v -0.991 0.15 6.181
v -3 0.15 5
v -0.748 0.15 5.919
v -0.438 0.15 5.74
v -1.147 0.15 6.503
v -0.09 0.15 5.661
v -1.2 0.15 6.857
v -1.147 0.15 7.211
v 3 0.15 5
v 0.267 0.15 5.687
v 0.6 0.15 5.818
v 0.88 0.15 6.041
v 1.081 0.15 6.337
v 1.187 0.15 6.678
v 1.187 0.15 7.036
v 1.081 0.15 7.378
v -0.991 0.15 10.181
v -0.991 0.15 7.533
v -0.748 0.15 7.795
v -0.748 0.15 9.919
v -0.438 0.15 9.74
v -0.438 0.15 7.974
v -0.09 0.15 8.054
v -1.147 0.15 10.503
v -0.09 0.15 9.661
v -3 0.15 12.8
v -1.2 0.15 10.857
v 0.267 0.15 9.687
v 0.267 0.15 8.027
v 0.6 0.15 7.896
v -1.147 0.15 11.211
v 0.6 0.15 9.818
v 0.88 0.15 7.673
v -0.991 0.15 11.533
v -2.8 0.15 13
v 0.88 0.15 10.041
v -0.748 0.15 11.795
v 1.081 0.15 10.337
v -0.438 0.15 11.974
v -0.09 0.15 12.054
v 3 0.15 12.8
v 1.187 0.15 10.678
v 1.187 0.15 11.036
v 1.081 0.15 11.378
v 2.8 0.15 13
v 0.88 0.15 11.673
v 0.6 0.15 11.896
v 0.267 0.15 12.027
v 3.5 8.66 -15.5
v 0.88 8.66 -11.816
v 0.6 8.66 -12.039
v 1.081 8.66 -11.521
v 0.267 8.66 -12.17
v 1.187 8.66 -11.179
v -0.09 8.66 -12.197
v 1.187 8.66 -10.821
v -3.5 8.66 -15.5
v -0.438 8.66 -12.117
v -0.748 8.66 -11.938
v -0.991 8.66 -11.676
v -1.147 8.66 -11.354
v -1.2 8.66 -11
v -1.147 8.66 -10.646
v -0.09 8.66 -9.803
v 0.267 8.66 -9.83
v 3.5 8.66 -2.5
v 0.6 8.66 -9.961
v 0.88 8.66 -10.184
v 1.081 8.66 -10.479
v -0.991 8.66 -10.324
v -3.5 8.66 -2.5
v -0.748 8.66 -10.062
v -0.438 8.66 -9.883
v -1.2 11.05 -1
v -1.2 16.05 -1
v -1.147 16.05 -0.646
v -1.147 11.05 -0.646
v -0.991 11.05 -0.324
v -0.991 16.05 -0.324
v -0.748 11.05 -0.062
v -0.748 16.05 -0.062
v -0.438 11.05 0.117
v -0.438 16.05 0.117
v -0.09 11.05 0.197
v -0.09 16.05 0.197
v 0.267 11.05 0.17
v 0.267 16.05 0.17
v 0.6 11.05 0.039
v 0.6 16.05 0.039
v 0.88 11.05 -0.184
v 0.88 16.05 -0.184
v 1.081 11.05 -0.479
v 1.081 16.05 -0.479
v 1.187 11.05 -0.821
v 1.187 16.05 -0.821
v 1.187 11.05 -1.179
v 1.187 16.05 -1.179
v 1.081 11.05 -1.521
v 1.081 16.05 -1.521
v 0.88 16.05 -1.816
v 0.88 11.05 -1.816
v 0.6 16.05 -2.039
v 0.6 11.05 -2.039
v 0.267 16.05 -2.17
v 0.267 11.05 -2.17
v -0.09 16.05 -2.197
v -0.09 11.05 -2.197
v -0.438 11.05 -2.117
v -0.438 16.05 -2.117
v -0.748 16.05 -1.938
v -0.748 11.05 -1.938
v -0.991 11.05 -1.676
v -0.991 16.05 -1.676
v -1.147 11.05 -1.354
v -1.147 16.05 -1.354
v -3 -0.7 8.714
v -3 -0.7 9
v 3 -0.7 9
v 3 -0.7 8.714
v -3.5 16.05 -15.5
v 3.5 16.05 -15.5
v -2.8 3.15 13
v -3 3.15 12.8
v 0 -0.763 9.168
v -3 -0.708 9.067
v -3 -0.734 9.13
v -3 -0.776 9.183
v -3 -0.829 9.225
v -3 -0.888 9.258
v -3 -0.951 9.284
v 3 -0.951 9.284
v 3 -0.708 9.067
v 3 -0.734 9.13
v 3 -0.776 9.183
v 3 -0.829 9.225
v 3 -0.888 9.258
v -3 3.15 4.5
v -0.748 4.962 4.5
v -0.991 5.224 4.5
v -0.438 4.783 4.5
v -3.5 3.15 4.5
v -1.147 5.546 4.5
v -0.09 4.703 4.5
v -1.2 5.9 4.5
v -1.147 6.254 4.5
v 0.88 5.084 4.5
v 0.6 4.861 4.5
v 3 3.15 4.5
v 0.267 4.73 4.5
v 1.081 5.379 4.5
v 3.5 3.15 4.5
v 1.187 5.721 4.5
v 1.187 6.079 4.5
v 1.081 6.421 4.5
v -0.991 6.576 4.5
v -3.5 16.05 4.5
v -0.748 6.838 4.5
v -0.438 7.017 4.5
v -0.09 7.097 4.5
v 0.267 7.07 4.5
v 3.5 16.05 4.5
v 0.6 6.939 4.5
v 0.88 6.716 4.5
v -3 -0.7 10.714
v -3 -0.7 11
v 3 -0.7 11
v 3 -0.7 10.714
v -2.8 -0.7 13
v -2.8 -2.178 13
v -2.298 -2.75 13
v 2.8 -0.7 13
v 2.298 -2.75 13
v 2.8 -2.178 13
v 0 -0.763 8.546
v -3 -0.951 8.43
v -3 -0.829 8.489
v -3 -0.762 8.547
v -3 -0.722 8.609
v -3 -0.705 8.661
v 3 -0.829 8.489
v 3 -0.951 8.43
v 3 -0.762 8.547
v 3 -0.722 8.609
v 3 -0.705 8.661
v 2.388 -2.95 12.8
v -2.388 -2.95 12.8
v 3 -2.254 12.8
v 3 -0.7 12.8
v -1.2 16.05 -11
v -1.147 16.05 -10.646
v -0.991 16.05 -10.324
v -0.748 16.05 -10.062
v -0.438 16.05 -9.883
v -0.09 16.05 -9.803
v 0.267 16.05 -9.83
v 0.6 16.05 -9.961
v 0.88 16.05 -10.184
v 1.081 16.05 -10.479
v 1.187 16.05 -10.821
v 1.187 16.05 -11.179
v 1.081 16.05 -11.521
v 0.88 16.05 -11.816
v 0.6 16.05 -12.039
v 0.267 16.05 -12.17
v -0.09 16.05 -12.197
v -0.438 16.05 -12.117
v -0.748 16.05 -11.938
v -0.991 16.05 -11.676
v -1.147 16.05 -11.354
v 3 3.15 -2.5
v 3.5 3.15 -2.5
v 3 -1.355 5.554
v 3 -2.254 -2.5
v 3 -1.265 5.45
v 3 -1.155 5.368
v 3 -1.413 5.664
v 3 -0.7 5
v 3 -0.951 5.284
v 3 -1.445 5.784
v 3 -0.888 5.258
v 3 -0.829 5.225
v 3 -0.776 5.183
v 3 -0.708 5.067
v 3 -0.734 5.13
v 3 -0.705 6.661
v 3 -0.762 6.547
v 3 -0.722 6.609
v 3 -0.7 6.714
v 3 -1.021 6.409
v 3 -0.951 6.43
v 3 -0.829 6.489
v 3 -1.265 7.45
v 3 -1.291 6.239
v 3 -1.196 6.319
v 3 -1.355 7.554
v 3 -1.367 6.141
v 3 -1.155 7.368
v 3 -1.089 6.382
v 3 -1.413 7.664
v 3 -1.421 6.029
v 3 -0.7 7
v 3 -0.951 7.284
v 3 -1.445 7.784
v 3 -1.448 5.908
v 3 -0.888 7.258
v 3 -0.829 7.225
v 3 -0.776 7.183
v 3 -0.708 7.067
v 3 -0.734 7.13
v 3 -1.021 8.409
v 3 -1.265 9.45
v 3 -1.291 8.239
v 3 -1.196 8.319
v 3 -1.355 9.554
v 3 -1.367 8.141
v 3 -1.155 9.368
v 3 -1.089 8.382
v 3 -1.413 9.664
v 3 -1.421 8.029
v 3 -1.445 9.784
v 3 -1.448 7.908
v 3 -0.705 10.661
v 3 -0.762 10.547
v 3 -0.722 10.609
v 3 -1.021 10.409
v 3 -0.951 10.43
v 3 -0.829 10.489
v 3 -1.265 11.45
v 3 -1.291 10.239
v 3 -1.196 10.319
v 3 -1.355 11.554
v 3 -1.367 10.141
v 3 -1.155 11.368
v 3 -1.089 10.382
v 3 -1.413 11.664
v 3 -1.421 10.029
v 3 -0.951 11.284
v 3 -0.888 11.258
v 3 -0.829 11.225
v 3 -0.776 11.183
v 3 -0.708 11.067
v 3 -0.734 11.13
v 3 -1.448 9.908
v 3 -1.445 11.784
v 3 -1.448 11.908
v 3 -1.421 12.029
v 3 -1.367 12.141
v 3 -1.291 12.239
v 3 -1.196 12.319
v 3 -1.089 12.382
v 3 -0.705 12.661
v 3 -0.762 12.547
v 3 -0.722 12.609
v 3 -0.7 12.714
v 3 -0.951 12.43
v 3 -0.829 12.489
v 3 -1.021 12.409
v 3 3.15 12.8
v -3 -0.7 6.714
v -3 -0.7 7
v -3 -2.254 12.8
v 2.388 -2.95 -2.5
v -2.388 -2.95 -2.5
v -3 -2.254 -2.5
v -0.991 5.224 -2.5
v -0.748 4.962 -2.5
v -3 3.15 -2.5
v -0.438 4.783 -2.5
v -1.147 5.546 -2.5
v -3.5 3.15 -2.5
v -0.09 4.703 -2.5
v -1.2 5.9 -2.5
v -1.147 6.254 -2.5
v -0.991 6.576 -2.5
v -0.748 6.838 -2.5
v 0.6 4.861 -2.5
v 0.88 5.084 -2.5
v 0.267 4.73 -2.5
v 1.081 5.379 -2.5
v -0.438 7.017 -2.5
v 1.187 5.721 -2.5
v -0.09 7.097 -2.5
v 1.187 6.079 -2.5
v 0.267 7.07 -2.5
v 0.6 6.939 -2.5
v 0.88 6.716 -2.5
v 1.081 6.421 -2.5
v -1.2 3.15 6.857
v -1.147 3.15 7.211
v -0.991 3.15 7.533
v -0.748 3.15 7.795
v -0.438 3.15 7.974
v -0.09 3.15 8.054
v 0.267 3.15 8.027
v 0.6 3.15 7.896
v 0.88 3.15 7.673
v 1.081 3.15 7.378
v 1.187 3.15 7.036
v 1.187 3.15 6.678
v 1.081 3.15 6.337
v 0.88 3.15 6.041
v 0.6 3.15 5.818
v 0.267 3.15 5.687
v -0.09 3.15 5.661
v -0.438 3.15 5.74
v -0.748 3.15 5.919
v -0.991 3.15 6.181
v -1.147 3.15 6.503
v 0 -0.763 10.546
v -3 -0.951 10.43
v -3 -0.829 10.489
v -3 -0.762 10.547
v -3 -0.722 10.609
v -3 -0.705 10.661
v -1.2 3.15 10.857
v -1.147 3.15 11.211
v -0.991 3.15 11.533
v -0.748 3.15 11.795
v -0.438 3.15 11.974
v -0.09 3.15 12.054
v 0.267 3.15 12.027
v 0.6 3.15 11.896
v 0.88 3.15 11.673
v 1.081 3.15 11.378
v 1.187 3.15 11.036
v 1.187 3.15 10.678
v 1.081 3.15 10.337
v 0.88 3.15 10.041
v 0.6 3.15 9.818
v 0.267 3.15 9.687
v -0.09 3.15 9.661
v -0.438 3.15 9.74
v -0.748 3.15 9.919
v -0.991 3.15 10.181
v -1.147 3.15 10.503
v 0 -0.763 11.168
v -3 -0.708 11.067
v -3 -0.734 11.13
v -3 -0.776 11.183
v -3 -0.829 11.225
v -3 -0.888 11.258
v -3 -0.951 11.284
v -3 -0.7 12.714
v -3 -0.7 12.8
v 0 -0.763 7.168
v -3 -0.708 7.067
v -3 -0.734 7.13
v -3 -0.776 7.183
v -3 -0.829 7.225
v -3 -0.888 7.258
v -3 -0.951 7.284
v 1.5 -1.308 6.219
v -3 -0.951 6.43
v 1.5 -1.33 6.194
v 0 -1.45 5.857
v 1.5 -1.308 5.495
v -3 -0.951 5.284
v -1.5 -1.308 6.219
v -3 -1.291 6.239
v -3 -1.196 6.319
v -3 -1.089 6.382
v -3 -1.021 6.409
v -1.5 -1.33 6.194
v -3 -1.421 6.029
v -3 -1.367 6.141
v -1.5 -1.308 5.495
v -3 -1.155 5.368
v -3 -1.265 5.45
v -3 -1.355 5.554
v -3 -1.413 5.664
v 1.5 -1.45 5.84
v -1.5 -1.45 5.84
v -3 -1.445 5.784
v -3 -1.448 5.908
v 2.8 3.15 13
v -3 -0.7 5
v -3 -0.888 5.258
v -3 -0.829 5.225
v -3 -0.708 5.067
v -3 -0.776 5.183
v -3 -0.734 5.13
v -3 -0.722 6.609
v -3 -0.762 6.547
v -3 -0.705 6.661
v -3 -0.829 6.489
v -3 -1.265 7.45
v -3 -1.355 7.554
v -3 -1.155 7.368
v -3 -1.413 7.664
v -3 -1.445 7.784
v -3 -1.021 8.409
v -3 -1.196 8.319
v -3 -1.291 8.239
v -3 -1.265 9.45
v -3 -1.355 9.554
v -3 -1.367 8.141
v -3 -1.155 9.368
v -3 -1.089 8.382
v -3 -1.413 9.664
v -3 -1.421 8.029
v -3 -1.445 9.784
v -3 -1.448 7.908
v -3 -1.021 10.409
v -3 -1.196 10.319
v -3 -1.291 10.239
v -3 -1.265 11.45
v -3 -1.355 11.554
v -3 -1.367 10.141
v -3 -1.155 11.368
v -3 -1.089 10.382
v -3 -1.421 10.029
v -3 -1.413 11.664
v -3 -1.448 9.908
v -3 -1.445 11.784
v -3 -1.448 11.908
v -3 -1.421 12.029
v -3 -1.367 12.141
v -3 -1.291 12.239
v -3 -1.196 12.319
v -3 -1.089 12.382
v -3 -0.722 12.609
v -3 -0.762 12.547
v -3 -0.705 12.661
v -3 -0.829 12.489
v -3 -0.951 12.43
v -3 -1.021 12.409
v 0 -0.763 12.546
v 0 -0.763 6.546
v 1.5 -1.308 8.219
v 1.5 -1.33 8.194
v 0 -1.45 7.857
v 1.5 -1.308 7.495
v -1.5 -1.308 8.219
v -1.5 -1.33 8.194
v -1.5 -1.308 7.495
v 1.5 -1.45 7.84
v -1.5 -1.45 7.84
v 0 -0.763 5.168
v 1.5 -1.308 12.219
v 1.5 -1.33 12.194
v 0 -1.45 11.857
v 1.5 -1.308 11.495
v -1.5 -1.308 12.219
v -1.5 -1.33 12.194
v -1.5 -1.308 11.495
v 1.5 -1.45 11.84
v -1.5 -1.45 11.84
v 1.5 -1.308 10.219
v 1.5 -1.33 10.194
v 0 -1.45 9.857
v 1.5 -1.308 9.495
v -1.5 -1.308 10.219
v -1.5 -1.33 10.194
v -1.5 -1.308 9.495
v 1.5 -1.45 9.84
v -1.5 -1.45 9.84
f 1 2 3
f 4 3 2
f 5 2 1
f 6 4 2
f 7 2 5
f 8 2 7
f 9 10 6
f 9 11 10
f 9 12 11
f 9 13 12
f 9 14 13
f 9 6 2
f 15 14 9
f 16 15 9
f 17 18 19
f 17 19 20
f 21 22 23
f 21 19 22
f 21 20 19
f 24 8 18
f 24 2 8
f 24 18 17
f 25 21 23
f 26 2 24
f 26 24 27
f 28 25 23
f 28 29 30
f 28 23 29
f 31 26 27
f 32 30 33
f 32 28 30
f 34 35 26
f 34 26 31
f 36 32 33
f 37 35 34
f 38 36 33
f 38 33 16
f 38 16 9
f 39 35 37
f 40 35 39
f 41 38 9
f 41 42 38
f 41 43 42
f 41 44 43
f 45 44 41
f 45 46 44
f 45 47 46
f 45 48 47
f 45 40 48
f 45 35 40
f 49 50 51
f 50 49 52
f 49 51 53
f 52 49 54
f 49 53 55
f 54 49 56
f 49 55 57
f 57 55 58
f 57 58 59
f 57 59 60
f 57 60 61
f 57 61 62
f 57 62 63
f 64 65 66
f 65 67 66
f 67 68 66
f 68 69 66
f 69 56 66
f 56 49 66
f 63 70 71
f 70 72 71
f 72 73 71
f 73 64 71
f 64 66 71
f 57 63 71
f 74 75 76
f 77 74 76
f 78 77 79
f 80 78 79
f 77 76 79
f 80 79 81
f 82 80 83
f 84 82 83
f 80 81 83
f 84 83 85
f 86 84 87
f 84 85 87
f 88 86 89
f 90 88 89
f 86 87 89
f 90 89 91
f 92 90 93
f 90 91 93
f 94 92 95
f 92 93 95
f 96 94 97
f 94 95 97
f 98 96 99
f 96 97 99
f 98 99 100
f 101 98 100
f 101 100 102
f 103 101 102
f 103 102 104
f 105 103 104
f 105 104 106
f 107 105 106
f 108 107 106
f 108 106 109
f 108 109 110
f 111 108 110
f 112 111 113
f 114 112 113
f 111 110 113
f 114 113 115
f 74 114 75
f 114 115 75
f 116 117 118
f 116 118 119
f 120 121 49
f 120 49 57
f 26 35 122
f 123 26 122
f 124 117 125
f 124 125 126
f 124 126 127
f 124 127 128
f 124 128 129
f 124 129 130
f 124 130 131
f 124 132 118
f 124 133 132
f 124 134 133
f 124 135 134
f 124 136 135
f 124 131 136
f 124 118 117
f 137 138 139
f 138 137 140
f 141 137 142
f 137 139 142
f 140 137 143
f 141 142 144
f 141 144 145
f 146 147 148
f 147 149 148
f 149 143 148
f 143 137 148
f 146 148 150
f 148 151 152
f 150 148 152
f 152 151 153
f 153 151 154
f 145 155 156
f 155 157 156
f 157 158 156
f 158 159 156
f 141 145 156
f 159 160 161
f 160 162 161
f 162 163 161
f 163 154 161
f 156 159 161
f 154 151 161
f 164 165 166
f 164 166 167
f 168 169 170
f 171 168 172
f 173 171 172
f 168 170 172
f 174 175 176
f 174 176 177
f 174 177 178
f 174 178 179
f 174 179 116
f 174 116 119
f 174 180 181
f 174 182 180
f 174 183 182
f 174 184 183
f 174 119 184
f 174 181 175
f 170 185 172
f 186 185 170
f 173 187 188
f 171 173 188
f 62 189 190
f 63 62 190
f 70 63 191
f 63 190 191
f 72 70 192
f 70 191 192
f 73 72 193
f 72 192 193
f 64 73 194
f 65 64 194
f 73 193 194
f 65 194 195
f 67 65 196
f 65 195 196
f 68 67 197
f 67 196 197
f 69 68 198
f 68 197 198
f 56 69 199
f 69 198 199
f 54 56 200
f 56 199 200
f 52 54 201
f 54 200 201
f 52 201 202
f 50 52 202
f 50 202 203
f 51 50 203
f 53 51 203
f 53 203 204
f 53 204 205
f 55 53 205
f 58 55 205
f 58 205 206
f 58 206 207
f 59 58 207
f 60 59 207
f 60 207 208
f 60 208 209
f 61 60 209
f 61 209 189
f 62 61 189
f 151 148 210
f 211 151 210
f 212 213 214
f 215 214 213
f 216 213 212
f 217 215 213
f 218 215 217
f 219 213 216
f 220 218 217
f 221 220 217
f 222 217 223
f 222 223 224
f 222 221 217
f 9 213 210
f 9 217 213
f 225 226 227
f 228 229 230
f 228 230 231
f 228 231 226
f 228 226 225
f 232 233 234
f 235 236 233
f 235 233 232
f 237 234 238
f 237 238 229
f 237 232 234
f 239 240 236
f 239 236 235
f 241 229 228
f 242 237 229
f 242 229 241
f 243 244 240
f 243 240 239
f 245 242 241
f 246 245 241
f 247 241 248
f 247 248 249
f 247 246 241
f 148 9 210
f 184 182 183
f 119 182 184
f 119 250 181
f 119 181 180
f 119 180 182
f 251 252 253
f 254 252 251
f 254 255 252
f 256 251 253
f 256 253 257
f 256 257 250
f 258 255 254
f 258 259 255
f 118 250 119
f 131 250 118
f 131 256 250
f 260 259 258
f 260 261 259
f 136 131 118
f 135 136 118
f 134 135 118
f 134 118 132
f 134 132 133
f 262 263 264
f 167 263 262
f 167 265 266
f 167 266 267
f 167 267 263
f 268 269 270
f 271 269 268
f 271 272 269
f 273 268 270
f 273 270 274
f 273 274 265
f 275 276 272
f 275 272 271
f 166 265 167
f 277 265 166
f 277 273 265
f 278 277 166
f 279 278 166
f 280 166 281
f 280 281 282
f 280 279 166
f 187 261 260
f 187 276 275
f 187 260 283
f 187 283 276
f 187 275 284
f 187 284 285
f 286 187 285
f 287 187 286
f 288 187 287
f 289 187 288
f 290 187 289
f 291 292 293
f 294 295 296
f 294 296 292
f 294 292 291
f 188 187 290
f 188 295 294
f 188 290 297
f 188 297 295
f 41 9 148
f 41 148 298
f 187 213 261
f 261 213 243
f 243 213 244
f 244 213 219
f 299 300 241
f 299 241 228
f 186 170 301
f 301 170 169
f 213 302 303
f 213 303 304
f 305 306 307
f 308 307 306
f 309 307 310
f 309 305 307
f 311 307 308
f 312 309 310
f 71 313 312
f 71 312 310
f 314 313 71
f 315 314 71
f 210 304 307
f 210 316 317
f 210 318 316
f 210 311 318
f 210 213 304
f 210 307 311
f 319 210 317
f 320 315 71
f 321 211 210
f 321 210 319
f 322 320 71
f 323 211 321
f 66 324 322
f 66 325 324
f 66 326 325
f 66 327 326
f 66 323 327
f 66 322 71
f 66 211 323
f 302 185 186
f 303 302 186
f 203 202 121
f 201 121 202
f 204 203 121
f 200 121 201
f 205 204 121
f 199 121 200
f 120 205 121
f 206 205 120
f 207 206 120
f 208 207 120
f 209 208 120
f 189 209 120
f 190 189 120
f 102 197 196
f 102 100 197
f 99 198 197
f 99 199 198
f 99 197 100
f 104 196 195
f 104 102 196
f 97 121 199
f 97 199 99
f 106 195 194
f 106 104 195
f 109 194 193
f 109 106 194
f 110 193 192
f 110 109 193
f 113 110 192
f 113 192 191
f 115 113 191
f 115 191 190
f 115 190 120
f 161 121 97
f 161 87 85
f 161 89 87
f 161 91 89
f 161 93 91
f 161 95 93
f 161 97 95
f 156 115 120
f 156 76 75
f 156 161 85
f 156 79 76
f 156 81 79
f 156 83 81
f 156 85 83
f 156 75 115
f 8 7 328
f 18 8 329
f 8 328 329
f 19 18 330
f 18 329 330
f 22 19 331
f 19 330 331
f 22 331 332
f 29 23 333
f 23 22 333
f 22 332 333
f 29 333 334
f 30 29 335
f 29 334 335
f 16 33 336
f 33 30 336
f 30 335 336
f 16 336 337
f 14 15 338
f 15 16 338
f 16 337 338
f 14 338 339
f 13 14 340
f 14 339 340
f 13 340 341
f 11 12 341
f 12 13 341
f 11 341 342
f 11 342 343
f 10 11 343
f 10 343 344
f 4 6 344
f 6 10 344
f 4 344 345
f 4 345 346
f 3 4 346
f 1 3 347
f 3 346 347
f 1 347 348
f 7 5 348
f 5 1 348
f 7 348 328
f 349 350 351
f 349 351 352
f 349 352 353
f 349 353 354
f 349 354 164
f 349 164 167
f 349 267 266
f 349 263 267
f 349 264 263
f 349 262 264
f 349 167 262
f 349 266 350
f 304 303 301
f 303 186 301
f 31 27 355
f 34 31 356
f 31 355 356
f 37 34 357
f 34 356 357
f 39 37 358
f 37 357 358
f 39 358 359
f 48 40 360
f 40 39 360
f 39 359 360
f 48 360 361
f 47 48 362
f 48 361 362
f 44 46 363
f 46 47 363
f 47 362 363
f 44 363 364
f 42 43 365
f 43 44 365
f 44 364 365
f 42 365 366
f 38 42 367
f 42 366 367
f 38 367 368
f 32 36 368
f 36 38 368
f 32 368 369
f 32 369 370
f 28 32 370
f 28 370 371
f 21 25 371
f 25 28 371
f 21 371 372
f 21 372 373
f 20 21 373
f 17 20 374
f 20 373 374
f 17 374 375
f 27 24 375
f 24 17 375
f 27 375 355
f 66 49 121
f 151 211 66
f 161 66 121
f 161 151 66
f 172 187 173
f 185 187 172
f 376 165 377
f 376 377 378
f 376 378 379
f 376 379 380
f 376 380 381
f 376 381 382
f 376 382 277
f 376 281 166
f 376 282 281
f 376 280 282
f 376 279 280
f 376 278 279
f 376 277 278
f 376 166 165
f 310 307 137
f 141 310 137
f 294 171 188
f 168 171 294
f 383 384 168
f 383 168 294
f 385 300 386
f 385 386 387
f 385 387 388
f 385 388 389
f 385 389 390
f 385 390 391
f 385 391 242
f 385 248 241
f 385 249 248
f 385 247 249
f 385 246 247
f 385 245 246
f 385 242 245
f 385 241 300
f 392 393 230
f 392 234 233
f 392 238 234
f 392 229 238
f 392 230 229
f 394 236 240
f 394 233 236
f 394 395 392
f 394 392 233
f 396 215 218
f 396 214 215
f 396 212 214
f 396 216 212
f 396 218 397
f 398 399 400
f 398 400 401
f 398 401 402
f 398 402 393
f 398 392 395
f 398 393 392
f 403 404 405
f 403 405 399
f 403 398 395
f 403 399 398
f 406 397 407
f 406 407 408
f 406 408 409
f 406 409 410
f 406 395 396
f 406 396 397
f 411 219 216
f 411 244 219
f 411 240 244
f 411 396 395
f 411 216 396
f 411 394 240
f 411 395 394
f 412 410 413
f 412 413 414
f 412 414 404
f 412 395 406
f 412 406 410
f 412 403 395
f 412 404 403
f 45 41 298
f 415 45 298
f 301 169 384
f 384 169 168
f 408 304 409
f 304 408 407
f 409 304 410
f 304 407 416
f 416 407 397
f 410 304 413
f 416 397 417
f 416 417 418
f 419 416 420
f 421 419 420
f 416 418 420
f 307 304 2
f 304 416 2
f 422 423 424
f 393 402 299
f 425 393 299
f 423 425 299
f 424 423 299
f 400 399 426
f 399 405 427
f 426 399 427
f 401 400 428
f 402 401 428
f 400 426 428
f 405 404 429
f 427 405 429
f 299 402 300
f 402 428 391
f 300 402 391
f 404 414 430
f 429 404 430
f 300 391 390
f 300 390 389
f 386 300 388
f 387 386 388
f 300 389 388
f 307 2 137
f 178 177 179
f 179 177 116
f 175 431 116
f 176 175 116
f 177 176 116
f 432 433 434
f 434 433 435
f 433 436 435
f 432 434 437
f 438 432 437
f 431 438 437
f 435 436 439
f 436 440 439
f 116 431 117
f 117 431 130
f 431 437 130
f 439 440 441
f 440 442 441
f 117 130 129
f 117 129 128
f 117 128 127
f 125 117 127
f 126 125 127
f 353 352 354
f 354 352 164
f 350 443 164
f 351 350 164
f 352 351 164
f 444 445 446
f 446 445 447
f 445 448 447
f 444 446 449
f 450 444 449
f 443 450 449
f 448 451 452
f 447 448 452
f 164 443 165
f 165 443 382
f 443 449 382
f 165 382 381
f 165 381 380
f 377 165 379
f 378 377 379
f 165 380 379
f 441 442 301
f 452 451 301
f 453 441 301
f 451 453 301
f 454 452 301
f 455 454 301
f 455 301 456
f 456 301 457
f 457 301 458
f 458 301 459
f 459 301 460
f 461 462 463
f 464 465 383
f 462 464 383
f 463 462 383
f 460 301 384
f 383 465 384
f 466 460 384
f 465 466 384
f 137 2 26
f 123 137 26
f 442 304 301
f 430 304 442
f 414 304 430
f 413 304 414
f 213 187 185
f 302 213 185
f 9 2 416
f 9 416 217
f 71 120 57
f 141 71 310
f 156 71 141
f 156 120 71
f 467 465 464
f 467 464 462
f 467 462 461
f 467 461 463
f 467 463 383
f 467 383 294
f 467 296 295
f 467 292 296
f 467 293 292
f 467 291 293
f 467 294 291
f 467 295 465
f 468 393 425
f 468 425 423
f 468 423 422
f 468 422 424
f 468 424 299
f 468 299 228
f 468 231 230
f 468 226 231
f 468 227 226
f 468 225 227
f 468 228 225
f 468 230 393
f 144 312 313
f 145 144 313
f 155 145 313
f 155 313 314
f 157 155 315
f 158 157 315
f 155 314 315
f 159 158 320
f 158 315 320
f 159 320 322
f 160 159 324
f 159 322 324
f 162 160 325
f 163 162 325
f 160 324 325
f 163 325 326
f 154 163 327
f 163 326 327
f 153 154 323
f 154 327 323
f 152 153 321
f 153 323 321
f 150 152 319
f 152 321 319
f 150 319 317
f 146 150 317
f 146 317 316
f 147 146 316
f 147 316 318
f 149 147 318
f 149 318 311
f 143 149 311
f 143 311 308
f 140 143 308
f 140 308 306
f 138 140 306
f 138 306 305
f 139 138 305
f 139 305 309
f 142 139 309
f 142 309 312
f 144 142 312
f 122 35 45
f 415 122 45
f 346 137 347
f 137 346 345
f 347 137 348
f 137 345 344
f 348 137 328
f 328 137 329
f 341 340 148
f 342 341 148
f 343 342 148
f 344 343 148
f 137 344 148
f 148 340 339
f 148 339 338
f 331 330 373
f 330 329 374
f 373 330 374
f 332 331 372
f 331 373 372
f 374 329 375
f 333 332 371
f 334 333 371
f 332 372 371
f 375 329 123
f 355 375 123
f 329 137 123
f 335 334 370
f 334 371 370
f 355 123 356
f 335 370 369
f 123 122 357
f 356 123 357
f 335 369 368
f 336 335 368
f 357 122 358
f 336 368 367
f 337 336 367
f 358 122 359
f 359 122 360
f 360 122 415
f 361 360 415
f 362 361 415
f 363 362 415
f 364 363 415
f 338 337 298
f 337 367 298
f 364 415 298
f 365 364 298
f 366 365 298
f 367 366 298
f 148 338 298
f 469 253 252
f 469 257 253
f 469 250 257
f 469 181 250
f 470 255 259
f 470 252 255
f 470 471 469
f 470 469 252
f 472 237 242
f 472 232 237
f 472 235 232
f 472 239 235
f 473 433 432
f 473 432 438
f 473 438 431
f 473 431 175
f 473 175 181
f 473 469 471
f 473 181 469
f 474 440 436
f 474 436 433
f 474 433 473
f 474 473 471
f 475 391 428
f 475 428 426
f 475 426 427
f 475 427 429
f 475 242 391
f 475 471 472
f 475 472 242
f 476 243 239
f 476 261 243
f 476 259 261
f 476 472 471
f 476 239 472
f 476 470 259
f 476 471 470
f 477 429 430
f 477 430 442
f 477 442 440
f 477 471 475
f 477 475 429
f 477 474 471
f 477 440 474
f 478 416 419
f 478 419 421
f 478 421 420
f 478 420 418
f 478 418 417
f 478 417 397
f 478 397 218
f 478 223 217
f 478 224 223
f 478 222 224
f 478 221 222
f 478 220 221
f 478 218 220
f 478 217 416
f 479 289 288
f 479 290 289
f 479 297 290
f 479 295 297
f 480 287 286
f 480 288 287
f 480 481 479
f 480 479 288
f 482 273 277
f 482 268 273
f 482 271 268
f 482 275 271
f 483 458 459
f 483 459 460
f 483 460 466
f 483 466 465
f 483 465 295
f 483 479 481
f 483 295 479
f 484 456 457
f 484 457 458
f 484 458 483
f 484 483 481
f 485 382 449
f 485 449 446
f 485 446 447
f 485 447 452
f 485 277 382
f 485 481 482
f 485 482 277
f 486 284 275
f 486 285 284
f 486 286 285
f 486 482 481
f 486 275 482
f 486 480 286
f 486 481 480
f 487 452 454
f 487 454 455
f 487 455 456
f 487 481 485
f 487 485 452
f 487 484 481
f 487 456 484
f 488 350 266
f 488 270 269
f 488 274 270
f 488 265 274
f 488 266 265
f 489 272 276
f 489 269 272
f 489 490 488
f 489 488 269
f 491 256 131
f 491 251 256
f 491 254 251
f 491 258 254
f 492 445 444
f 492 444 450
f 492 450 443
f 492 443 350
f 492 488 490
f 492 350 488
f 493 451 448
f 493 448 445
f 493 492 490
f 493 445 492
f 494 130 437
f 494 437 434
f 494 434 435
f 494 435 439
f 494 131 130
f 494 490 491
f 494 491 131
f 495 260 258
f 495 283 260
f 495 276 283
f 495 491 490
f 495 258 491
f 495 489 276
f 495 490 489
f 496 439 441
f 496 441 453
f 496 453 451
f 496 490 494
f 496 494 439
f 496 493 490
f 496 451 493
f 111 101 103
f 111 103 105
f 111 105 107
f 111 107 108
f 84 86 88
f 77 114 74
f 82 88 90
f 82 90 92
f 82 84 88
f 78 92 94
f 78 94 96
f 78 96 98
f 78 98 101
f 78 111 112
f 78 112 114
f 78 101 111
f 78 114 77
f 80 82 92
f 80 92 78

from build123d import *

# Parameters (mm, degrees)
BOSS_EXTRUDE1_DEPTH     = 13
SKETCH6_W               = 6
SKETCH6_H               = 5
BOSS_EXTRUDE4_DEPTH     = 5.6
SKETCH16_W              = 6
SKETCH16_H              = 8
BOSS_EXTRUDE5_DEPTH     = 0.1
CUT_EXTRUDE6_DEPTH      = 4
CUT_EXTRUDE6_DEPTH_BACK = 3.6
SKETCH15_R              = 1.2
CUT_EXTRUDE7_DEPTH      = 8.7202
CUT_EXTRUDE8_START      = -0.2202
SKETCH19_W              = 6
SKETCH19_H              = 8
SKETCH19_R              = 1.2
CUT_EXTRUDE8_DEPTH      = 0.2202
SKETCH12_R              = 1.2
CUT_EXTRUDE5_DEPTH      = 6
CHAMFER1_SIZE           = 0.2
SKETCH21_R              = 1.2
BOSS_EXTRUDE6_DEPTH     = 2.5
SKETCH24_W              = 6
SKETCH24_H              = 5.5
CUT_EXTRUDE10_DEPTH     = 8.5
SKETCH25_W              = 6
SKETCH25_H              = 7
BOSS_EXTRUDE8_DEPTH     = 12.9
SKETCH26_W              = 6
SKETCH26_H              = 7.39
BOSS_EXTRUDE9_DEPTH     = 5
SKETCH27_W              = 6
SKETCH27_H              = 7.39
BOSS_EXTRUDE10_DEPTH    = 8
SKETCH28_R              = 1.2
CUT_EXTRUDE11_DEPTH     = 7.5
SKETCH30_R              = 1.2
CUT_EXTRUDE13_DEPTH     = 8
SKETCH31_W              = 7
SKETCH31_H              = 12.9
BOSS_EXTRUDE11_DEPTH    = 0.5
SKETCH32_W              = 7
SKETCH32_H              = 12.9
BOSS_EXTRUDE12_DEPTH    = 0.5
SKETCH33_W              = 0.5
SKETCH33_H              = 7.39
BOSS_EXTRUDE13_DEPTH    = 13
SKETCH34_R              = 1.2
CUT_EXTRUDE14_DEPTH     = 5


with BuildPart() as part:
    # Sketch1 → Boss-Extrude1 (new body)
    with BuildSketch(Plane.XY):
        Polygon((3, 3.05), (3, -2.253801214), (2.388188946, -2.95), (-2.388188946, -2.95), (-3, -2.253801214), (-3, 3.05), align=None)
    extrude(amount=BOSS_EXTRUDE1_DEPTH)

    # Sketch6 → Boss-Extrude4 (add)
    with BuildSketch(Plane(origin=(0, 3.05, 0), x_dir=(1, 0, 0), z_dir=(0, 1, 0))):
        with Locations((0, -2.5)):
            Rectangle(SKETCH6_W, SKETCH6_H)
    extrude(amount=BOSS_EXTRUDE4_DEPTH)

    # Sketch16 → Boss-Extrude5 (add)
    with BuildSketch(Plane(origin=(0, 3.05, 0), x_dir=(1, 0, 0), z_dir=(0, 1, 0))):
        with Locations((0, -9)):
            Rectangle(SKETCH16_W, SKETCH16_H)
    extrude(amount=BOSS_EXTRUDE5_DEPTH)

    # Sketch18 → Cut-Extrude6 (cut, two sides: drawn at the far end of the back side and taken through both)
    with BuildSketch(Plane(origin=(0, 0, 0), x_dir=(0, 0, -1), z_dir=(1, 0, 0)).offset(-CUT_EXTRUDE6_DEPTH_BACK)):
        with BuildLine():
            Line((-8.8572, -0.0702), (-12.8572, -0.0702))
            Line((-12.8572, -0.0702), (-13, -0.0702))
            Line((-13, -0.0702), (-13, -0.7))
            Line((-13, -0.7), (-12.8572, -0.7))
            Line((-12.8572, -0.7), (-12.7144, -0.7))
            add(Edge.make_bspline(
                [(-12.7144, -0.7), (-12.5198, -0.7), (-12.43, -0.9509)],
                knots=[0.103448276, 0.103448276, 0.103448276, 0.137931034, 0.137931034, 0.137931034], degree=2))
            add(Edge.make_bspline(
                [(-12.43, -0.9509), (-12.3594, -1.2388), (-12.13, -1.45), (-11.8572, -1.45)],
                knots=[0.137931034, 0.137931034, 0.137931034, 0.137931034, 0.172413793, 0.172413793, 0.172413793, 0.172413793], degree=3))
            add(Edge.make_bspline(
                [(-11.8572, -1.45), (-11.5844, -1.45), (-11.355, -1.2388), (-11.2844, -0.9509)],
                knots=[0.172413793, 0.172413793, 0.172413793, 0.172413793, 0.206896552, 0.206896552, 0.206896552, 0.206896552], degree=3))
            add(Edge.make_bspline(
                [(-11.2844, -0.9509), (-11.1946, -0.7), (-11, -0.7)],
                knots=[0.206896552, 0.206896552, 0.206896552, 0.24137931, 0.24137931, 0.24137931], degree=2))
            Line((-11, -0.7), (-10.8572, -0.7))
            Line((-10.8572, -0.7), (-10.7144, -0.7))
            add(Edge.make_bspline(
                [(-10.7144, -0.7), (-10.5198, -0.7), (-10.43, -0.9509)],
                knots=[0.310344828, 0.310344828, 0.310344828, 0.344827586, 0.344827586, 0.344827586], degree=2))
            add(Edge.make_bspline(
                [(-10.43, -0.9509), (-10.3594, -1.2388), (-10.13, -1.45), (-9.8572, -1.45)],
                knots=[0.344827586, 0.344827586, 0.344827586, 0.344827586, 0.379310345, 0.379310345, 0.379310345, 0.379310345], degree=3))
            add(Edge.make_bspline(
                [(-9.8572, -1.45), (-9.5844, -1.45), (-9.355, -1.2388), (-9.2844, -0.9509)],
                knots=[0.379310345, 0.379310345, 0.379310345, 0.379310345, 0.413793103, 0.413793103, 0.413793103, 0.413793103], degree=3))
            add(Edge.make_bspline(
                [(-9.2844, -0.9509), (-9.1946, -0.7), (-9, -0.7)],
                knots=[0.413793103, 0.413793103, 0.413793103, 0.448275862, 0.448275862, 0.448275862], degree=2))
            Line((-9, -0.7), (-8.8572, -0.7))
            Line((-8.8572, -0.7), (-8.7144, -0.7))
            add(Edge.make_bspline(
                [(-8.7144, -0.7), (-8.5198, -0.7), (-8.43, -0.9509)],
                knots=[0.517241379, 0.517241379, 0.517241379, 0.551724138, 0.551724138, 0.551724138], degree=2))
            add(Edge.make_bspline(
                [(-8.43, -0.9509), (-8.3594, -1.2388), (-8.13, -1.45), (-7.8572, -1.45)],
                knots=[0.551724138, 0.551724138, 0.551724138, 0.551724138, 0.586206897, 0.586206897, 0.586206897, 0.586206897], degree=3))
            add(Edge.make_bspline(
                [(-7.8572, -1.45), (-7.5844, -1.45), (-7.355, -1.2388), (-7.2844, -0.9509)],
                knots=[0.586206897, 0.586206897, 0.586206897, 0.586206897, 0.620689655, 0.620689655, 0.620689655, 0.620689655], degree=3))
            add(Edge.make_bspline(
                [(-7.2844, -0.9509), (-7.1946, -0.7), (-7, -0.7)],
                knots=[0.620689655, 0.620689655, 0.620689655, 0.655172414, 0.655172414, 0.655172414], degree=2))
            Line((-7, -0.7), (-6.8572, -0.7))
            Line((-6.8572, -0.7), (-6.7144, -0.7))
            add(Edge.make_bspline(
                [(-6.7144, -0.7), (-6.5198, -0.7), (-6.43, -0.9509)],
                knots=[0.724137931, 0.724137931, 0.724137931, 0.75862069, 0.75862069, 0.75862069], degree=2))
            add(Edge.make_bspline(
                [(-6.43, -0.9509), (-6.3594, -1.2388), (-6.13, -1.45), (-5.8572, -1.45)],
                knots=[0.75862069, 0.75862069, 0.75862069, 0.75862069, 0.793103448, 0.793103448, 0.793103448, 0.793103448], degree=3))
            add(Edge.make_bspline(
                [(-5.8572, -1.45), (-5.5844, -1.45), (-5.355, -1.2388), (-5.2844, -0.9509)],
                knots=[0.793103448, 0.793103448, 0.793103448, 0.793103448, 0.827586207, 0.827586207, 0.827586207, 0.827586207], degree=3))
            add(Edge.make_bspline(
                [(-5.2844, -0.9509), (-5.1946, -0.7), (-5, -0.7)],
                knots=[0.827586207, 0.827586207, 0.827586207, 0.862068966, 0.862068966, 0.862068966], degree=2))
            Line((-5, -0.7), (-5, -0.0702))
            Line((-5, -0.0702), (-8.8572, -0.0702))
        make_face()
    extrude(amount=CUT_EXTRUDE6_DEPTH + CUT_EXTRUDE6_DEPTH_BACK, mode=Mode.SUBTRACT)

    # Sketch15 → Cut-Extrude7 (cut)
    with BuildSketch(Plane(origin=(0, 8.65, 0), x_dir=(1, 0, 0), z_dir=(0, 1, 0))):
        with Locations(Location((0, -10.8572, 0), (0, 0, 180))):
            Circle(SKETCH15_R)
        with Locations(Location((0, -6.8572, 0), (0, 0, 180))):
            Circle(SKETCH15_R)
    extrude(amount=-CUT_EXTRUDE7_DEPTH, mode=Mode.SUBTRACT)

    # Sketch19 → Cut-Extrude8 (cut)
    with BuildSketch(Plane.XZ.offset(0.0702).offset(CUT_EXTRUDE8_START)):
        with Locations((0, 9)):
            Rectangle(SKETCH19_W, SKETCH19_H)
        with Locations(Location((0, 10.8572, 0), (0, 0, 180))):
            Circle(SKETCH19_R, mode=Mode.SUBTRACT)
        with Locations(Location((0, 6.8572, 0), (0, 0, 180))):
            Circle(SKETCH19_R, mode=Mode.SUBTRACT)
    extrude(amount=CUT_EXTRUDE8_DEPTH, mode=Mode.SUBTRACT)

    # Sketch12 → Cut-Extrude5 (cut)
    with BuildSketch(Plane.XY.offset(5)):
        with Locations((0, 5.85)):
            Circle(SKETCH12_R)
    extrude(amount=-CUT_EXTRUDE5_DEPTH, mode=Mode.SUBTRACT)

    # Chamfer1
    chamfer1_edges = [part.edges().sort_by_distance(p)[0] for p in [
        (-2.694094473, -2.601900607, 13),
        (0, -2.95, 13),
        (2.694094473, -2.601900607, 13),
        (3, 1.65, 13),
        (3, -1.476900607, 13),
        (-3, -1.476900607, 13),
        (-3, 1.65, 13),
    ]]
    chamfer(chamfer1_edges, length=CHAMFER1_SIZE)

    # Sketch21 → Boss-Extrude6 (add)
    with BuildSketch(Plane(origin=(0, 0, 0), x_dir=(-1, 0, 0), z_dir=(0, 0, -1))):
        Polygon((-2.388188946, -2.95), (2.388188946, -2.95), (3, -2.253801214), (3, 8.65), (-3, 8.65), (-3, -2.253801214), align=None)
        with Locations(Location((0, 5.85, 0), (0, 0, 180))):
            Circle(SKETCH21_R, mode=Mode.SUBTRACT)
    extrude(amount=BOSS_EXTRUDE6_DEPTH)

    # Sketch24 → Cut-Extrude10 (cut)
    with BuildSketch(Plane.XY.offset(5)):
        with Locations((0, 5.9)):
            Rectangle(SKETCH24_W, SKETCH24_H)
    extrude(amount=-CUT_EXTRUDE10_DEPTH, mode=Mode.SUBTRACT)

    # Sketch25 → Boss-Extrude8 (add)
    with BuildSketch(Plane(origin=(0, 3.15, 0), x_dir=(1, 0, 0), z_dir=(0, 1, 0))):
        with Locations((0, -1)):
            Rectangle(SKETCH25_W, SKETCH25_H)
    extrude(amount=BOSS_EXTRUDE8_DEPTH)

    # Sketch26 → Boss-Extrude9 (add)
    with BuildSketch(Plane(origin=(0, 0, -2.5), x_dir=(-1, 0, 0), z_dir=(0, 0, -1))):
        with Locations((0, 12.355)):
            Rectangle(SKETCH26_W, SKETCH26_H)
    extrude(amount=BOSS_EXTRUDE9_DEPTH)

    # Sketch27 → Boss-Extrude10 (add)
    with BuildSketch(Plane(origin=(0, 0, -7.5), x_dir=(-1, 0, 0), z_dir=(0, 0, -1))):
        with Locations((0, 12.355)):
            Rectangle(SKETCH27_W, SKETCH27_H)
    extrude(amount=BOSS_EXTRUDE10_DEPTH)

    # Sketch28 → Cut-Extrude11 (cut)
    with BuildSketch(Plane(origin=(0, 16.05, 0), x_dir=(1, 0, 0), z_dir=(0, 1, 0))):
        with Locations(Location((0, 11, 0), (0, 0, 180))):
            Circle(SKETCH28_R)
    extrude(amount=-CUT_EXTRUDE11_DEPTH, mode=Mode.SUBTRACT)

    # Sketch30 → Cut-Extrude13 (cut)
    with BuildSketch(Plane(origin=(0, 0, -2.5), x_dir=(-1, 0, 0), z_dir=(0, 0, -1))):
        with Locations((0, 5.9)):
            Circle(SKETCH30_R)
    extrude(amount=-CUT_EXTRUDE13_DEPTH, mode=Mode.SUBTRACT)

    # Sketch31 → Boss-Extrude11 (add)
    with BuildSketch(Plane(origin=(3, 0, 0), x_dir=(0, 0, -1), z_dir=(1, 0, 0))):
        with Locations((-1, 9.6)):
            Rectangle(SKETCH31_W, SKETCH31_H)
    extrude(amount=BOSS_EXTRUDE11_DEPTH)

    # Sketch32 → Boss-Extrude12 (add)
    with BuildSketch(Plane.ZY.offset(3)):
        with Locations((1, 9.6)):
            Rectangle(SKETCH32_W, SKETCH32_H)
    extrude(amount=BOSS_EXTRUDE12_DEPTH)

    # Sketch33 → Boss-Extrude13 (add)
    with BuildSketch(Plane(origin=(0, 0, -2.5), x_dir=(-1, 0, 0), z_dir=(0, 0, -1))):
        with Locations((-3.25, 12.355)):
            Rectangle(SKETCH33_W, SKETCH33_H)
        with Locations((3.25, 12.355)):
            Rectangle(SKETCH33_W, SKETCH33_H)
    extrude(amount=BOSS_EXTRUDE13_DEPTH)

    # Sketch34 → Cut-Extrude14 (cut)
    with BuildSketch(Plane(origin=(0, 16.05, 0), x_dir=(1, 0, 0), z_dir=(0, 1, 0))):
        with Locations(Location((0, 1, 0), (0, 0, 180))):
            Circle(SKETCH34_R)
    extrude(amount=-CUT_EXTRUDE14_DEPTH, mode=Mode.SUBTRACT)


solid = part.part
